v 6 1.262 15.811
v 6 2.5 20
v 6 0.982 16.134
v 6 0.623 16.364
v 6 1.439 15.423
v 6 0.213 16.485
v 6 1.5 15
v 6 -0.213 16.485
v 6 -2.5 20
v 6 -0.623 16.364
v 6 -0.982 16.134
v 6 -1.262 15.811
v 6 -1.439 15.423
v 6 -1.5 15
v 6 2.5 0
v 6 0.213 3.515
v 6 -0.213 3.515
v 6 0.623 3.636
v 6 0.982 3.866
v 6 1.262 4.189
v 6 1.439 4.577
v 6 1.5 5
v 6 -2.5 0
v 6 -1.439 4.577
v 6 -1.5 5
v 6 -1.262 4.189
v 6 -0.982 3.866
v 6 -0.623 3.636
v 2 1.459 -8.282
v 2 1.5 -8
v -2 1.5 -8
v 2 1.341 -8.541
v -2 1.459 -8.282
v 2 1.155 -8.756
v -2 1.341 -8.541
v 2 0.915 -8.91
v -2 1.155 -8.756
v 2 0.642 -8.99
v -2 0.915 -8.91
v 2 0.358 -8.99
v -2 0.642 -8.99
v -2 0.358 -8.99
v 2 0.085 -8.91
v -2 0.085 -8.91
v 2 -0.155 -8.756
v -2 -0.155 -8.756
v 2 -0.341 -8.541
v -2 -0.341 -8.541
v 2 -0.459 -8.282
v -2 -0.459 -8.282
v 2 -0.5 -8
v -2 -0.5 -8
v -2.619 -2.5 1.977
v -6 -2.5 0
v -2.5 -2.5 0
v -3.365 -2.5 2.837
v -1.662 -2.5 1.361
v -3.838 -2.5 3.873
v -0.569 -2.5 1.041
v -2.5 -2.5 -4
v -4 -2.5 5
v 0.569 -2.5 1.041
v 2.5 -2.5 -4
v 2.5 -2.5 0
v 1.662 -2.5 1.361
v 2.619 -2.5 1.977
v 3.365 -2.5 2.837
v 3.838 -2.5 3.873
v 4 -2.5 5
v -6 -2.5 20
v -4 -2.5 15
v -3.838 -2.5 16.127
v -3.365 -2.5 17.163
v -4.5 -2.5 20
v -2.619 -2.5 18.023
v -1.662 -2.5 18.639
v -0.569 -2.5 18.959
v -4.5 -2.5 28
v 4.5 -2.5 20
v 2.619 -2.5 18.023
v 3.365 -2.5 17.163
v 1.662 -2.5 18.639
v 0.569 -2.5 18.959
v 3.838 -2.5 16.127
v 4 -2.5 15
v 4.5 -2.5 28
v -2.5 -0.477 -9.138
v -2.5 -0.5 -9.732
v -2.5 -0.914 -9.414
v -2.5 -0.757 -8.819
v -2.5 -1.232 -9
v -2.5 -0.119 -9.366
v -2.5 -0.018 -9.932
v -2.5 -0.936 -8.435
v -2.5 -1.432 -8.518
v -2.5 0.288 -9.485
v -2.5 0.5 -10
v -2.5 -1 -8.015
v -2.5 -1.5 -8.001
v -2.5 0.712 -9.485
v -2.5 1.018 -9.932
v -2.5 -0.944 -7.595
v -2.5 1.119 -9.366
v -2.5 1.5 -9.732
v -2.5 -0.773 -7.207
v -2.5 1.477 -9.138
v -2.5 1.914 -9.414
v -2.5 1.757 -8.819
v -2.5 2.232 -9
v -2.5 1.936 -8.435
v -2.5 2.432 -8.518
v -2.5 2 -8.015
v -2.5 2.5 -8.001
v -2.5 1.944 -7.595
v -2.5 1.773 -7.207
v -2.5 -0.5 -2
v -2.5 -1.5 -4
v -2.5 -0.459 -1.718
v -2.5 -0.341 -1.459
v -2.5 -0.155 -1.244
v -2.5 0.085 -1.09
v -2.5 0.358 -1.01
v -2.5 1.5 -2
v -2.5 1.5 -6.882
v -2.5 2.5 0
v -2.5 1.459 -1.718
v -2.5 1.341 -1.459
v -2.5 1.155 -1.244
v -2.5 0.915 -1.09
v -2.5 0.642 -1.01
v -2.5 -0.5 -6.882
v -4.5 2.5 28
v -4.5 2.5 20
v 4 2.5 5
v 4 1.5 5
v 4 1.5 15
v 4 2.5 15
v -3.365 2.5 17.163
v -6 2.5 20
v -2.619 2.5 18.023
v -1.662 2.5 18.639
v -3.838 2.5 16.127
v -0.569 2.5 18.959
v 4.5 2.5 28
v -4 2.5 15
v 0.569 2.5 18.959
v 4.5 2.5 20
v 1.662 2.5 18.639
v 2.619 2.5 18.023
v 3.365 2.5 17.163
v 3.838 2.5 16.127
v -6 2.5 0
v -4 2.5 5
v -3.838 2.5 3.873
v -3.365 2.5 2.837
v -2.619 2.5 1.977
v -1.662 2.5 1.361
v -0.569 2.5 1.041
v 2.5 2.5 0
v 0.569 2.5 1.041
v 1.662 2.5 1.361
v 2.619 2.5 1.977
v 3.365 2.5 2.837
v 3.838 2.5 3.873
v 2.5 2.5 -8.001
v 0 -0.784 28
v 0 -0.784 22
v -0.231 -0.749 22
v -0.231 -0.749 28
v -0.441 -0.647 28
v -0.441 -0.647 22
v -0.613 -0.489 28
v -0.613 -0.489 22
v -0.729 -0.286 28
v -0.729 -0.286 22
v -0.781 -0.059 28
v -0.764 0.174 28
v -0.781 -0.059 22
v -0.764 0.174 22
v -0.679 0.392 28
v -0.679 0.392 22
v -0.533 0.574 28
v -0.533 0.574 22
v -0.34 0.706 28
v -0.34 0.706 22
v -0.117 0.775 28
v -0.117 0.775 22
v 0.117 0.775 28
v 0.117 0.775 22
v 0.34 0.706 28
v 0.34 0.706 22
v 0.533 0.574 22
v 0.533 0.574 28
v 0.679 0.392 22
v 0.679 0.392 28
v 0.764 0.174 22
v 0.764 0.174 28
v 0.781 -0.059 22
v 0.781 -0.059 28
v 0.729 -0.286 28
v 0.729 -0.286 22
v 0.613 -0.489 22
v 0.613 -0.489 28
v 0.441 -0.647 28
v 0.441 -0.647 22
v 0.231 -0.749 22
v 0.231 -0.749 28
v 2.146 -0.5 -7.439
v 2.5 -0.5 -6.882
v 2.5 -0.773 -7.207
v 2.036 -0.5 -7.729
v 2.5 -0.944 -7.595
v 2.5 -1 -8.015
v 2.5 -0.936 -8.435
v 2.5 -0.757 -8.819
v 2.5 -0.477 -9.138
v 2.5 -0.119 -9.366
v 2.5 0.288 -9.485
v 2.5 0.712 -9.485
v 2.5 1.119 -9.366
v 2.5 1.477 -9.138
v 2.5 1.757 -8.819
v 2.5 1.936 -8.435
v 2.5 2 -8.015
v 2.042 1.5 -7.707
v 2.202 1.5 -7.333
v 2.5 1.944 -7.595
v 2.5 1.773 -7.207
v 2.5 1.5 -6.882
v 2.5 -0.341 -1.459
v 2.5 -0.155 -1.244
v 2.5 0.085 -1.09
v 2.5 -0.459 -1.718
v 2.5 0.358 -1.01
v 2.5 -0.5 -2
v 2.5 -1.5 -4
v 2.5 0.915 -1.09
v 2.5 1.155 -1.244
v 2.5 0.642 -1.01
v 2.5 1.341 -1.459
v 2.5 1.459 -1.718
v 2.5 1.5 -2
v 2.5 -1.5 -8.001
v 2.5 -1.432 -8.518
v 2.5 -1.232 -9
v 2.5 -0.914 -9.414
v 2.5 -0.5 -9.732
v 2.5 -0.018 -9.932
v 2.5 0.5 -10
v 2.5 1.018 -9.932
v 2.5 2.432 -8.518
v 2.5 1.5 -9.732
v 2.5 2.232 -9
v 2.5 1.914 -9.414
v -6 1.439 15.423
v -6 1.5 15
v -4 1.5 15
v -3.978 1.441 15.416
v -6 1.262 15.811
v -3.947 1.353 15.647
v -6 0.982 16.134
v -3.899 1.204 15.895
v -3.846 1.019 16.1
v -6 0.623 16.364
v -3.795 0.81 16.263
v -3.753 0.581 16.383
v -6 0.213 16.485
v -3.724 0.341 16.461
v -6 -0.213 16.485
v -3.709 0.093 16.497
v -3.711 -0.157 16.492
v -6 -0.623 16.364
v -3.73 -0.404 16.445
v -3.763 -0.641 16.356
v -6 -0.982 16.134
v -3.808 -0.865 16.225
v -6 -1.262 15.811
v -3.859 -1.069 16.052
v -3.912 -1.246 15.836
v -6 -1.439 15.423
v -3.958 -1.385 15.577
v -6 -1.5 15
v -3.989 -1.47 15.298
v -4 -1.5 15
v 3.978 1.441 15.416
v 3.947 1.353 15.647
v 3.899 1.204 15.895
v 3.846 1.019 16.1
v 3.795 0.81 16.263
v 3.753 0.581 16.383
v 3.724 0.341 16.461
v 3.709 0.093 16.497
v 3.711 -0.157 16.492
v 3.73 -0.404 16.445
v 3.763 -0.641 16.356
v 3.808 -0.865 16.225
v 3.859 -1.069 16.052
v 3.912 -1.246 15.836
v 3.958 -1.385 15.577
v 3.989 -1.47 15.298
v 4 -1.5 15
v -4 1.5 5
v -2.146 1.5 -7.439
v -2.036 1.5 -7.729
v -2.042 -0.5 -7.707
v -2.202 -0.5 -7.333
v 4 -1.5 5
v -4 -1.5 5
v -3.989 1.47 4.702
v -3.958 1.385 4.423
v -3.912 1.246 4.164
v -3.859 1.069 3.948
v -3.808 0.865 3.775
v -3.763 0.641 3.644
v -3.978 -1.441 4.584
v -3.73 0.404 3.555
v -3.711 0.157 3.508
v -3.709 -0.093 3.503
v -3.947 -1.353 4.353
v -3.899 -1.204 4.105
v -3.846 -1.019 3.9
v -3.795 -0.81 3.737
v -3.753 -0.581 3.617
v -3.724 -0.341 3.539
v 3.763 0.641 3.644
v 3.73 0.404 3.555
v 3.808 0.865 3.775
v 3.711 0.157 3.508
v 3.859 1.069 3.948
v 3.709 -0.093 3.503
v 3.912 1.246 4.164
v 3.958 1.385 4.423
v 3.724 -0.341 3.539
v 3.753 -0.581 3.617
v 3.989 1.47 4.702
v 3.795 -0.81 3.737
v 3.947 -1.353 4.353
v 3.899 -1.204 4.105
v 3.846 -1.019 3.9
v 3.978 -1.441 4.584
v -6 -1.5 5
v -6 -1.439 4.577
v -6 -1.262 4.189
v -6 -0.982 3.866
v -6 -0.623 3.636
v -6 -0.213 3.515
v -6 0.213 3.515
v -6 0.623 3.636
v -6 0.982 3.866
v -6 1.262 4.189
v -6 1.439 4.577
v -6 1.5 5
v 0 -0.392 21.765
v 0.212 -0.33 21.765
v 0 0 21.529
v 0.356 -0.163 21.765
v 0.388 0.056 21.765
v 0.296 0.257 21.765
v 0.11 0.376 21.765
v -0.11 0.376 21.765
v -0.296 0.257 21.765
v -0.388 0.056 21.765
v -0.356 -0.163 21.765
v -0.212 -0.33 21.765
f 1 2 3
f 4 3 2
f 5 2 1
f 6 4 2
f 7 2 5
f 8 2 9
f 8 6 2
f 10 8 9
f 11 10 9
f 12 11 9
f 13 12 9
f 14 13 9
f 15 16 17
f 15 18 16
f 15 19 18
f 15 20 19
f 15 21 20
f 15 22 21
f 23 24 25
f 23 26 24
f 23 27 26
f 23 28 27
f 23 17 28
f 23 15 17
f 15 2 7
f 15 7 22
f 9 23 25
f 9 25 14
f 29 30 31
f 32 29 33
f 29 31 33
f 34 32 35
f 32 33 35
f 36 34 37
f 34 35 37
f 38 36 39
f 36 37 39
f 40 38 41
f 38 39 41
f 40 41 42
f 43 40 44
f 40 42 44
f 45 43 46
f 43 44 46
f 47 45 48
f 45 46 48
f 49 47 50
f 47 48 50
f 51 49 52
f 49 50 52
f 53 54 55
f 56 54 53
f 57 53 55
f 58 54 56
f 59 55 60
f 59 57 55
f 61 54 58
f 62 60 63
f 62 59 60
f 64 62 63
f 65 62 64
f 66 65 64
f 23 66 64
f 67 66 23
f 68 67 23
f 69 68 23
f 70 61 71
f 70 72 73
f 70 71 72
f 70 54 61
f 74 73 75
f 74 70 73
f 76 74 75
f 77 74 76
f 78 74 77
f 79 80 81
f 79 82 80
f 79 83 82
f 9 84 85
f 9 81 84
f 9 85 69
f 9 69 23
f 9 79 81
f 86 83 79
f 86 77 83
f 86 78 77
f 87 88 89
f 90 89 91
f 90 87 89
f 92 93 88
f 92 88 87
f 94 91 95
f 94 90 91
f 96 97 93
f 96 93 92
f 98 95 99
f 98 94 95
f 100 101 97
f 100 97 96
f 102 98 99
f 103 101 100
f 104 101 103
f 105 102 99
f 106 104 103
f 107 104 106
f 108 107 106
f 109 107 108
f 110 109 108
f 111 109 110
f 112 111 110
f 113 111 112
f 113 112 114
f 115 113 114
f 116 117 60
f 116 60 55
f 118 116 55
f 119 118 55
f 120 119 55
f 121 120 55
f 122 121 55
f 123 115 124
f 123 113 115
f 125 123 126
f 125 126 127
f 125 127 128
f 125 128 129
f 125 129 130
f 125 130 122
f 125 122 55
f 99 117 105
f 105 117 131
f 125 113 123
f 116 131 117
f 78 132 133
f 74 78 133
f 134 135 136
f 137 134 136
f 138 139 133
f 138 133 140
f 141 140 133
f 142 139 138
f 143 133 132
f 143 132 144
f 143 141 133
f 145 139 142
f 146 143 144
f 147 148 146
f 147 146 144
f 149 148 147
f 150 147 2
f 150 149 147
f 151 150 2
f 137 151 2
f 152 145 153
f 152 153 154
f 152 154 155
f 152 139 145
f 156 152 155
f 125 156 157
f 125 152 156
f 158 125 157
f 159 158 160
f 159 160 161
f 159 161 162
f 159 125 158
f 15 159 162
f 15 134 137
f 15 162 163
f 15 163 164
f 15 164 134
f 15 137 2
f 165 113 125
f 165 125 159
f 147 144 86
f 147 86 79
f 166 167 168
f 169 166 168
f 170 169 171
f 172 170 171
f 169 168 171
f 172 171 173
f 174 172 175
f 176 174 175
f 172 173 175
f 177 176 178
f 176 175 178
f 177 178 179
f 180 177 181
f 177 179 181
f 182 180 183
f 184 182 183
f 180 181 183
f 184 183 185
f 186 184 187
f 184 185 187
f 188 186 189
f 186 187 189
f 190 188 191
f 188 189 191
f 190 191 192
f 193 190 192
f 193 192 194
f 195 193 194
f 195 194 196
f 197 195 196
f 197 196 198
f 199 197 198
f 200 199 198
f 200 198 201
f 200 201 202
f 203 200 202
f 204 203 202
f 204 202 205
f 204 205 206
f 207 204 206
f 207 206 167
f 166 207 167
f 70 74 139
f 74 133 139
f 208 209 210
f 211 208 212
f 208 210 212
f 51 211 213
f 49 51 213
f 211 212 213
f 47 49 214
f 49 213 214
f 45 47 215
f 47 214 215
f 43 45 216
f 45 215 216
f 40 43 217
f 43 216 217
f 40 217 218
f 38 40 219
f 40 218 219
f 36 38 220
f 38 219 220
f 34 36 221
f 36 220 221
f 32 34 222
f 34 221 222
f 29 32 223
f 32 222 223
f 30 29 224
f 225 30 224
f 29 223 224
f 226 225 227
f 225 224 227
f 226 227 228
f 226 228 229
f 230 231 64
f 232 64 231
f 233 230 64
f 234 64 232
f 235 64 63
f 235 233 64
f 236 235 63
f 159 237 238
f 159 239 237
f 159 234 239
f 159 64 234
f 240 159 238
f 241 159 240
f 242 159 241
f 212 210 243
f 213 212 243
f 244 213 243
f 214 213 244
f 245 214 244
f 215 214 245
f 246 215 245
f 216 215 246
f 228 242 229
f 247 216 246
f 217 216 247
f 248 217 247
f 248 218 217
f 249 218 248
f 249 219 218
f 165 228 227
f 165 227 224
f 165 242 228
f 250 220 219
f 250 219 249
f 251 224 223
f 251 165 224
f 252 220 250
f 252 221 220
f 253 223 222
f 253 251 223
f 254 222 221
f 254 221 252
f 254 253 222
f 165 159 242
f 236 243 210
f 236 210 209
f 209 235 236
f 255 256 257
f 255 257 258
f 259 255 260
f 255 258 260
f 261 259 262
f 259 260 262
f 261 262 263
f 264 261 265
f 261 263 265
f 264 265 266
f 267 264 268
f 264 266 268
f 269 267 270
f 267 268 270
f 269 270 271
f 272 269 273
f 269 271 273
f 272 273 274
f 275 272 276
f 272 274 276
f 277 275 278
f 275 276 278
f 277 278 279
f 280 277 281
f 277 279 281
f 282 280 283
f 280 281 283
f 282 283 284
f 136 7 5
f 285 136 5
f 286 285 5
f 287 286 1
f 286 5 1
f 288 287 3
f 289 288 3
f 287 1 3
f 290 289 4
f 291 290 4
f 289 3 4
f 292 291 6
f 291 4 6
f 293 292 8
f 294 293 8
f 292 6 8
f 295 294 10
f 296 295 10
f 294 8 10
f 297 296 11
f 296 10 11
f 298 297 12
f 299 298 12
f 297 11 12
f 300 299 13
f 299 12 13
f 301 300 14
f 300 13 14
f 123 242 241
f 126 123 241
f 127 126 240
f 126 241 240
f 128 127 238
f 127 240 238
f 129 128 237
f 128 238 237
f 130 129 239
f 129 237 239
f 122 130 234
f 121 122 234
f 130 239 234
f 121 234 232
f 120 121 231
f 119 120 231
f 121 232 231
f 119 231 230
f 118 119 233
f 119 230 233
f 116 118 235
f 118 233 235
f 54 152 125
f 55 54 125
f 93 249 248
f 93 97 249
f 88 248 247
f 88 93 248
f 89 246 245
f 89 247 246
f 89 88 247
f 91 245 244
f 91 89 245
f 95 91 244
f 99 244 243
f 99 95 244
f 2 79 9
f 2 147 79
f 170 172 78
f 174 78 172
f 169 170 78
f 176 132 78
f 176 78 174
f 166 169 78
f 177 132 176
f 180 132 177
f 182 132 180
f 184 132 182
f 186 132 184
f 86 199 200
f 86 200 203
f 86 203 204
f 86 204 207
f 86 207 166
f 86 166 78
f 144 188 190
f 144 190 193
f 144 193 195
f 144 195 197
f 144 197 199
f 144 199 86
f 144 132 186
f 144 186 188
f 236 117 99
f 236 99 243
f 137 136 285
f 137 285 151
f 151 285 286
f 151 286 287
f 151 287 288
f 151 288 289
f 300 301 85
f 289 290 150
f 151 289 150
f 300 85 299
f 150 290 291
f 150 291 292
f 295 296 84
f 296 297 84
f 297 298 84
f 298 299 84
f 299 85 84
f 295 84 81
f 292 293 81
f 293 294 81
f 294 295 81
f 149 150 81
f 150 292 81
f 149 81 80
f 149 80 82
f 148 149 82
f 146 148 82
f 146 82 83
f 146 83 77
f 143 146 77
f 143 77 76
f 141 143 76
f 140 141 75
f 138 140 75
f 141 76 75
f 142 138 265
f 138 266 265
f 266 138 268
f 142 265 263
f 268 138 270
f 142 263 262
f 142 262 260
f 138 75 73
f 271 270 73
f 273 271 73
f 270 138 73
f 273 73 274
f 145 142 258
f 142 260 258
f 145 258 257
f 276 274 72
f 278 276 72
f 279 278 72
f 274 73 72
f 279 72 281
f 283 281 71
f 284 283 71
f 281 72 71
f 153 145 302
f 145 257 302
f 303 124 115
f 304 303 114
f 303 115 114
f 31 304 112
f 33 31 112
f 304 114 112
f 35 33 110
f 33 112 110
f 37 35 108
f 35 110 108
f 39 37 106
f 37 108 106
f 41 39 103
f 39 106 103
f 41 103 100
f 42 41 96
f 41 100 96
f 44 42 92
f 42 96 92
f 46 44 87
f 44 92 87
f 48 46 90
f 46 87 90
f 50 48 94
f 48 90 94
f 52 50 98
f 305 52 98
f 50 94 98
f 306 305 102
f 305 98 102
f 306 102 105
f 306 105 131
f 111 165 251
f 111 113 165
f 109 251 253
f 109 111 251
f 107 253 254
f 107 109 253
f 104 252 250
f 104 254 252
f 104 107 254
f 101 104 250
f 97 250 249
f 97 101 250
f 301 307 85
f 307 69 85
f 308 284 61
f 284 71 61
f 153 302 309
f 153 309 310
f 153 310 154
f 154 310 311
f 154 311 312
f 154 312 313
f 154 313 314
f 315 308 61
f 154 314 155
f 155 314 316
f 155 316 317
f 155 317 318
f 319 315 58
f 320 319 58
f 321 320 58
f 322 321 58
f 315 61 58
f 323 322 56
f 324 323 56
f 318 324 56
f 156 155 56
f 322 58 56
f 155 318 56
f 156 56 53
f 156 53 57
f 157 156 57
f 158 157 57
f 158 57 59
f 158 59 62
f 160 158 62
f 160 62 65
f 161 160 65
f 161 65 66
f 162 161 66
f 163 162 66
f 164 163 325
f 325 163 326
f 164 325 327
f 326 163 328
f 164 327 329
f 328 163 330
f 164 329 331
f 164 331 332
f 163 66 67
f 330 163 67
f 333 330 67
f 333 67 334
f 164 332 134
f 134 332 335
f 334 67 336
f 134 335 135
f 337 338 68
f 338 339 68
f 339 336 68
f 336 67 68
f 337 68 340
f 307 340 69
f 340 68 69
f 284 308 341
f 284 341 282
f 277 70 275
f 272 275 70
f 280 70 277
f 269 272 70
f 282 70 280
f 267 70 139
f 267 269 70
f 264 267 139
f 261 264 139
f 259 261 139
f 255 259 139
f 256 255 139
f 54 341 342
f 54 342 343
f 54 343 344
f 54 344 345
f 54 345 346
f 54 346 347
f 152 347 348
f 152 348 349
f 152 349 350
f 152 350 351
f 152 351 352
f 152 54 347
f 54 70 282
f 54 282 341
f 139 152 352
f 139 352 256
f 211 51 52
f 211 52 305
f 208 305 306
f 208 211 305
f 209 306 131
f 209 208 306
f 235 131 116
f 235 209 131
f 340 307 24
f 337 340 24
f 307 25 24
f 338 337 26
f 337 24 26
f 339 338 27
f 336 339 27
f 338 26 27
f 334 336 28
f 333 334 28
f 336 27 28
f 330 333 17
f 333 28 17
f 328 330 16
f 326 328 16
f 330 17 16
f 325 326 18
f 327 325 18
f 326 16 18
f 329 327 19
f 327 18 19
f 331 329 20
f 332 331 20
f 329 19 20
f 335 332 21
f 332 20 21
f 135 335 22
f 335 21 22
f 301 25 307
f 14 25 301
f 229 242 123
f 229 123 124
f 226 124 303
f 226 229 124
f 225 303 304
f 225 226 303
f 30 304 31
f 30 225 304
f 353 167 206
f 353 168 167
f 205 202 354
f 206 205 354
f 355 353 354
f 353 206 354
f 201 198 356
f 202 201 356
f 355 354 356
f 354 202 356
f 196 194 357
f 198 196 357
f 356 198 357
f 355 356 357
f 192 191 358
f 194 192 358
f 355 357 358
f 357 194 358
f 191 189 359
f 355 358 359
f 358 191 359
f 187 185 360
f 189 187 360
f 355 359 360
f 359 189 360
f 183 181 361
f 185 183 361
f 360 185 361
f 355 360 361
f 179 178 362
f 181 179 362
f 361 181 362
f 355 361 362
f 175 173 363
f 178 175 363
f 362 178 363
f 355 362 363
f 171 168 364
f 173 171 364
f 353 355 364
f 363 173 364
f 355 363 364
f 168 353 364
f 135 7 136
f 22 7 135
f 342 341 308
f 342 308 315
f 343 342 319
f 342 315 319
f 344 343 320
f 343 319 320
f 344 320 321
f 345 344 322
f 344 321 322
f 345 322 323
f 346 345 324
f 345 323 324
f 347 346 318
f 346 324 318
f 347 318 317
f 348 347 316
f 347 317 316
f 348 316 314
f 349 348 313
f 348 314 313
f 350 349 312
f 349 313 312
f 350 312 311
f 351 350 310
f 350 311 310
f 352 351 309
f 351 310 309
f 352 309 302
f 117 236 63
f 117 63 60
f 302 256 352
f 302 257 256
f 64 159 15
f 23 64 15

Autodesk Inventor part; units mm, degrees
ref_plane "YZ Plane" through (0, 0, 0) normal (1, 0, 0) x (0, 1, 0)
ref_plane "XZ Plane" through (0, 0, 0) normal (0, 1, 0) x (-1, 0, 0)
ref_plane "XY Plane" through (0, 0, 0) normal (0, 0, 1) x (1, 0, 0)
sketch "Skizze1" plane through (0, 0, 0) normal (0, 0, 1) x (1, 0, 0)
  line L0 (-8.4, 0) -> (8.4, 0) projected
  line L1 (0, -3.5) -> (0, 3.5) projected
  line L2 (-6, 2.5) -> (6, 2.5)
  line L3 (6, 2.5) -> (6, -2.5)
  line L4 (6, -2.5) -> (-6, -2.5)
  line L5 (-6, -2.5) -> (-6, 2.5)
  point P0 (0, 0)
  dimension "d0" = 12
  dimension "d1" = 5
extrude "Extrusion1" add sketch "Skizze1" along normal blind 28
sketch "Skizze2" plane through (-6, 2.5, 0) normal (0, 1, 0) x (1, 0, 0)
  line L0 (0, -28) -> (1.5, -28)
  line L1 (1.5, -28) -> (1.5, -20)
  line L2 (1.5, -20) -> (0, -20)
  line L3 (0, -20) -> (0, -28)
  line L4 (12, -28) -> (10.5, -28)
  line L5 (10.5, -28) -> (10.5, -20)
  line L6 (10.5, -20) -> (12, -20)
  line L7 (12, -20) -> (12, -28)
  line L8 (-2.4, 0) -> (14.4, 0) projected
  line L9 (6, 5.6) -> (6, -33.6) projected
  point P0 (6, 0)
  dimension "d4" = 9
  dimension "d5" = 8
extrude "Extrusion2" cut sketch "Skizze2" against normal through all
sketch "Skizze3" plane through (0, 0, 0) normal (0, 0, -1) x (-1, 0, 0)
  line L0 (6, 2.5) -> (-6, 2.5) projected
  line L1 (-2.5, 2.5) -> (2.5, 2.5)
  line L2 (2.5, 2.5) -> (2.5, -1.5)
  line L3 (2.5, -1.5) -> (-2.5, -1.5)
  line L4 (-2.5, -1.5) -> (-2.5, 2.5)
  line L5 (8.4, 0) -> (-8.4, 0) projected
  line L6 (0, -3.5) -> (0, 3.5) projected
  point P0 (0, 0)
  dimension "d8" = 5
  dimension "d9" = 4
extrude "Extrusion3" add sketch "Skizze3" along normal blind 10
sketch "Skizze5" plane through (0, 0, 28) normal (0, 0, 1) x (1, 0, 0)
  line L0 (-4.5, 2.5) -> (-4.5, -2.5) projected
  line L1 (-4.5, -2.5) -> (4.5, -2.5) projected
  line L2 (4.5, -2.5) -> (4.5, 2.5) projected
  line L3 (4.5, 2.5) -> (-4.5, 2.5) projected
  line L4 (-4.5, 0) -> (4.5, 0)
  line L5 (0, 2.5) -> (0, -2.5)
  point P0 (0, 0)
  point P1 (0, 0)
hole "Bohrung2" at (0, 0, 28) direction (0, 0, -1) diameter 1.567 depth 6 tip angle 118 thread size "M2x0.4" class "6H" standard "ISO Metric profile"
sketch "Skizze6" plane through (2.5, -1.5, 0) normal (1, 0, 0) x (0, 0, -1)
  line L0 (0, 0) -> (0, 4) projected
  line L1 (10, 4) -> (10, 0) projected
  line L2 (10, 2) -> (0, 2)
  point P0 (0, 1.5)
  point P1 (8, 2)
  dimension "d28" = 2
hole "Bohrung3" at (2.5, 0.5, -8) direction (-1, 0, 0) diameter 2 end through all countersink diameter 3 countersink angle 90
sketch "Skizze7" plane through (2.5, -1.5, 0) normal (1, 0, 0) x (0, 0, -1)
  circle A0 centre (8, 2) radius 1.5 projected
  line L0 (0, 0) -> (0, 4) projected
  line L1 (0, 0) -> (10, 0) projected
  line L2 (10, 4) -> (10, 0) projected
  line L3 (2, 2) -> (8, 2) construction
  line L4 (2, 3) -> (8, 3)
  line L5 (8, 1) -> (2, 1)
  arc A1 (2, 3) -> (2, 1) centre (2, 2) ccw
  arc A2 (8, 1) -> (8, 3) centre (8, 2) ccw
  point P0 (0, 1.5)
  point P1 (5, 2)
  dimension "d36" = 2
  dimension "d37" = 2
  dimension "d38" = 2
extrude "Extrusion4" cut sketch "Skizze7" against normal through all contours L4 A2 L5 A0 | A0 L5 A1 L4 picked at (7.5, 2)
sketch "Skizze8" plane through (-2.5, -1.5, 0) normal (0, -1, 0) x (1, 0, 0)
  line L0 (5, 0) -> (5, -10) projected
  line L1 (0, 0) -> (5, 0)
  line L2 (5, 0) -> (5, -4)
  line L3 (5, -4) -> (0, -4)
  line L4 (0, -4) -> (0, 0)
  point P0 (2.5, 0)
  dimension "d41" = 4
extrude "Extrusion5" add sketch "Skizze8" along normal blind 1
sketch "Skizze9" plane through (-2.5, -2.5, 0) normal (-1, 0, 0) x (0, 0, 1)
  arc A0 (-8, 4) -> (-8, 2) centre (-8, 3) ccw projected
  point P0 (0, 2.5)
hole "Bohrung4" at (-2.5, 0.5, -8) direction (1, 0, 0) diameter 2 end through all countersink diameter 3 countersink angle 90
fillet "Rundung1" radius 2 2 edges at (0, -1.5, -10) (0, 2.5, -10)
sketch "Skizze11" plane through (6, -2.5, 0) normal (1, 0, 0) x (0, 0, -1)
  line L0 (-20, 5) -> (-20, 0) projected
  line L1 (0, 0) -> (-20, 0) projected
  line L2 (0, 5) -> (0, 0) projected
  line L3 (-15, 2.5) -> (-5, 2.5) construction
  line L4 (-15, 4) -> (-5, 4)
  line L5 (-5, 1) -> (-15, 1)
  arc A0 (-15, 4) -> (-15, 1) centre (-15, 2.5) ccw
  arc A1 (-5, 1) -> (-5, 4) centre (-5, 2.5) ccw
  point P0 (0, 2.5)
  point P1 (-10, 2.5)
  dimension "d61" = 3
  dimension "d62" = 2.5
  dimension "d63" = 5
  dimension "d64" = 5
extrude "Extrusion6" cut sketch "Skizze11" against normal through all
sketch "Skizze12" plane through (-4.5, -2.5, 28) normal (0, -1, 0) x (1, 0, 0)
  line L0 (-1.5, -28) -> (-1.5, -8) projected
  line L1 (2, -28) -> (-1.5, -28) projected
  line L2 (10.5, -28) -> (10.5, -8) projected
  line L3 (10.5, -8) -> (9, -8) projected
  line L4 (4.5, -13) -> (4.5, -23) construction
  line L5 (0.5, -13) -> (0.5, -23)
  line L6 (8.5, -23) -> (8.5, -13)
  arc A0 (8.5, -13) -> (0.5, -13) centre (4.5, -13) ccw
  arc A1 (0.5, -23) -> (8.5, -23) centre (4.5, -23) ccw
  point P0 (4.5, -28)
  point P1 (4.5, -18)
  dimension "d67" = 6
  dimension "d68" = 8
  dimension "d69" = 5
  dimension "d70" = 5
extrude "Extrusion7" cut sketch "Skizze12" against normal through all
properties part number "13_1087_004" material "Titan"
